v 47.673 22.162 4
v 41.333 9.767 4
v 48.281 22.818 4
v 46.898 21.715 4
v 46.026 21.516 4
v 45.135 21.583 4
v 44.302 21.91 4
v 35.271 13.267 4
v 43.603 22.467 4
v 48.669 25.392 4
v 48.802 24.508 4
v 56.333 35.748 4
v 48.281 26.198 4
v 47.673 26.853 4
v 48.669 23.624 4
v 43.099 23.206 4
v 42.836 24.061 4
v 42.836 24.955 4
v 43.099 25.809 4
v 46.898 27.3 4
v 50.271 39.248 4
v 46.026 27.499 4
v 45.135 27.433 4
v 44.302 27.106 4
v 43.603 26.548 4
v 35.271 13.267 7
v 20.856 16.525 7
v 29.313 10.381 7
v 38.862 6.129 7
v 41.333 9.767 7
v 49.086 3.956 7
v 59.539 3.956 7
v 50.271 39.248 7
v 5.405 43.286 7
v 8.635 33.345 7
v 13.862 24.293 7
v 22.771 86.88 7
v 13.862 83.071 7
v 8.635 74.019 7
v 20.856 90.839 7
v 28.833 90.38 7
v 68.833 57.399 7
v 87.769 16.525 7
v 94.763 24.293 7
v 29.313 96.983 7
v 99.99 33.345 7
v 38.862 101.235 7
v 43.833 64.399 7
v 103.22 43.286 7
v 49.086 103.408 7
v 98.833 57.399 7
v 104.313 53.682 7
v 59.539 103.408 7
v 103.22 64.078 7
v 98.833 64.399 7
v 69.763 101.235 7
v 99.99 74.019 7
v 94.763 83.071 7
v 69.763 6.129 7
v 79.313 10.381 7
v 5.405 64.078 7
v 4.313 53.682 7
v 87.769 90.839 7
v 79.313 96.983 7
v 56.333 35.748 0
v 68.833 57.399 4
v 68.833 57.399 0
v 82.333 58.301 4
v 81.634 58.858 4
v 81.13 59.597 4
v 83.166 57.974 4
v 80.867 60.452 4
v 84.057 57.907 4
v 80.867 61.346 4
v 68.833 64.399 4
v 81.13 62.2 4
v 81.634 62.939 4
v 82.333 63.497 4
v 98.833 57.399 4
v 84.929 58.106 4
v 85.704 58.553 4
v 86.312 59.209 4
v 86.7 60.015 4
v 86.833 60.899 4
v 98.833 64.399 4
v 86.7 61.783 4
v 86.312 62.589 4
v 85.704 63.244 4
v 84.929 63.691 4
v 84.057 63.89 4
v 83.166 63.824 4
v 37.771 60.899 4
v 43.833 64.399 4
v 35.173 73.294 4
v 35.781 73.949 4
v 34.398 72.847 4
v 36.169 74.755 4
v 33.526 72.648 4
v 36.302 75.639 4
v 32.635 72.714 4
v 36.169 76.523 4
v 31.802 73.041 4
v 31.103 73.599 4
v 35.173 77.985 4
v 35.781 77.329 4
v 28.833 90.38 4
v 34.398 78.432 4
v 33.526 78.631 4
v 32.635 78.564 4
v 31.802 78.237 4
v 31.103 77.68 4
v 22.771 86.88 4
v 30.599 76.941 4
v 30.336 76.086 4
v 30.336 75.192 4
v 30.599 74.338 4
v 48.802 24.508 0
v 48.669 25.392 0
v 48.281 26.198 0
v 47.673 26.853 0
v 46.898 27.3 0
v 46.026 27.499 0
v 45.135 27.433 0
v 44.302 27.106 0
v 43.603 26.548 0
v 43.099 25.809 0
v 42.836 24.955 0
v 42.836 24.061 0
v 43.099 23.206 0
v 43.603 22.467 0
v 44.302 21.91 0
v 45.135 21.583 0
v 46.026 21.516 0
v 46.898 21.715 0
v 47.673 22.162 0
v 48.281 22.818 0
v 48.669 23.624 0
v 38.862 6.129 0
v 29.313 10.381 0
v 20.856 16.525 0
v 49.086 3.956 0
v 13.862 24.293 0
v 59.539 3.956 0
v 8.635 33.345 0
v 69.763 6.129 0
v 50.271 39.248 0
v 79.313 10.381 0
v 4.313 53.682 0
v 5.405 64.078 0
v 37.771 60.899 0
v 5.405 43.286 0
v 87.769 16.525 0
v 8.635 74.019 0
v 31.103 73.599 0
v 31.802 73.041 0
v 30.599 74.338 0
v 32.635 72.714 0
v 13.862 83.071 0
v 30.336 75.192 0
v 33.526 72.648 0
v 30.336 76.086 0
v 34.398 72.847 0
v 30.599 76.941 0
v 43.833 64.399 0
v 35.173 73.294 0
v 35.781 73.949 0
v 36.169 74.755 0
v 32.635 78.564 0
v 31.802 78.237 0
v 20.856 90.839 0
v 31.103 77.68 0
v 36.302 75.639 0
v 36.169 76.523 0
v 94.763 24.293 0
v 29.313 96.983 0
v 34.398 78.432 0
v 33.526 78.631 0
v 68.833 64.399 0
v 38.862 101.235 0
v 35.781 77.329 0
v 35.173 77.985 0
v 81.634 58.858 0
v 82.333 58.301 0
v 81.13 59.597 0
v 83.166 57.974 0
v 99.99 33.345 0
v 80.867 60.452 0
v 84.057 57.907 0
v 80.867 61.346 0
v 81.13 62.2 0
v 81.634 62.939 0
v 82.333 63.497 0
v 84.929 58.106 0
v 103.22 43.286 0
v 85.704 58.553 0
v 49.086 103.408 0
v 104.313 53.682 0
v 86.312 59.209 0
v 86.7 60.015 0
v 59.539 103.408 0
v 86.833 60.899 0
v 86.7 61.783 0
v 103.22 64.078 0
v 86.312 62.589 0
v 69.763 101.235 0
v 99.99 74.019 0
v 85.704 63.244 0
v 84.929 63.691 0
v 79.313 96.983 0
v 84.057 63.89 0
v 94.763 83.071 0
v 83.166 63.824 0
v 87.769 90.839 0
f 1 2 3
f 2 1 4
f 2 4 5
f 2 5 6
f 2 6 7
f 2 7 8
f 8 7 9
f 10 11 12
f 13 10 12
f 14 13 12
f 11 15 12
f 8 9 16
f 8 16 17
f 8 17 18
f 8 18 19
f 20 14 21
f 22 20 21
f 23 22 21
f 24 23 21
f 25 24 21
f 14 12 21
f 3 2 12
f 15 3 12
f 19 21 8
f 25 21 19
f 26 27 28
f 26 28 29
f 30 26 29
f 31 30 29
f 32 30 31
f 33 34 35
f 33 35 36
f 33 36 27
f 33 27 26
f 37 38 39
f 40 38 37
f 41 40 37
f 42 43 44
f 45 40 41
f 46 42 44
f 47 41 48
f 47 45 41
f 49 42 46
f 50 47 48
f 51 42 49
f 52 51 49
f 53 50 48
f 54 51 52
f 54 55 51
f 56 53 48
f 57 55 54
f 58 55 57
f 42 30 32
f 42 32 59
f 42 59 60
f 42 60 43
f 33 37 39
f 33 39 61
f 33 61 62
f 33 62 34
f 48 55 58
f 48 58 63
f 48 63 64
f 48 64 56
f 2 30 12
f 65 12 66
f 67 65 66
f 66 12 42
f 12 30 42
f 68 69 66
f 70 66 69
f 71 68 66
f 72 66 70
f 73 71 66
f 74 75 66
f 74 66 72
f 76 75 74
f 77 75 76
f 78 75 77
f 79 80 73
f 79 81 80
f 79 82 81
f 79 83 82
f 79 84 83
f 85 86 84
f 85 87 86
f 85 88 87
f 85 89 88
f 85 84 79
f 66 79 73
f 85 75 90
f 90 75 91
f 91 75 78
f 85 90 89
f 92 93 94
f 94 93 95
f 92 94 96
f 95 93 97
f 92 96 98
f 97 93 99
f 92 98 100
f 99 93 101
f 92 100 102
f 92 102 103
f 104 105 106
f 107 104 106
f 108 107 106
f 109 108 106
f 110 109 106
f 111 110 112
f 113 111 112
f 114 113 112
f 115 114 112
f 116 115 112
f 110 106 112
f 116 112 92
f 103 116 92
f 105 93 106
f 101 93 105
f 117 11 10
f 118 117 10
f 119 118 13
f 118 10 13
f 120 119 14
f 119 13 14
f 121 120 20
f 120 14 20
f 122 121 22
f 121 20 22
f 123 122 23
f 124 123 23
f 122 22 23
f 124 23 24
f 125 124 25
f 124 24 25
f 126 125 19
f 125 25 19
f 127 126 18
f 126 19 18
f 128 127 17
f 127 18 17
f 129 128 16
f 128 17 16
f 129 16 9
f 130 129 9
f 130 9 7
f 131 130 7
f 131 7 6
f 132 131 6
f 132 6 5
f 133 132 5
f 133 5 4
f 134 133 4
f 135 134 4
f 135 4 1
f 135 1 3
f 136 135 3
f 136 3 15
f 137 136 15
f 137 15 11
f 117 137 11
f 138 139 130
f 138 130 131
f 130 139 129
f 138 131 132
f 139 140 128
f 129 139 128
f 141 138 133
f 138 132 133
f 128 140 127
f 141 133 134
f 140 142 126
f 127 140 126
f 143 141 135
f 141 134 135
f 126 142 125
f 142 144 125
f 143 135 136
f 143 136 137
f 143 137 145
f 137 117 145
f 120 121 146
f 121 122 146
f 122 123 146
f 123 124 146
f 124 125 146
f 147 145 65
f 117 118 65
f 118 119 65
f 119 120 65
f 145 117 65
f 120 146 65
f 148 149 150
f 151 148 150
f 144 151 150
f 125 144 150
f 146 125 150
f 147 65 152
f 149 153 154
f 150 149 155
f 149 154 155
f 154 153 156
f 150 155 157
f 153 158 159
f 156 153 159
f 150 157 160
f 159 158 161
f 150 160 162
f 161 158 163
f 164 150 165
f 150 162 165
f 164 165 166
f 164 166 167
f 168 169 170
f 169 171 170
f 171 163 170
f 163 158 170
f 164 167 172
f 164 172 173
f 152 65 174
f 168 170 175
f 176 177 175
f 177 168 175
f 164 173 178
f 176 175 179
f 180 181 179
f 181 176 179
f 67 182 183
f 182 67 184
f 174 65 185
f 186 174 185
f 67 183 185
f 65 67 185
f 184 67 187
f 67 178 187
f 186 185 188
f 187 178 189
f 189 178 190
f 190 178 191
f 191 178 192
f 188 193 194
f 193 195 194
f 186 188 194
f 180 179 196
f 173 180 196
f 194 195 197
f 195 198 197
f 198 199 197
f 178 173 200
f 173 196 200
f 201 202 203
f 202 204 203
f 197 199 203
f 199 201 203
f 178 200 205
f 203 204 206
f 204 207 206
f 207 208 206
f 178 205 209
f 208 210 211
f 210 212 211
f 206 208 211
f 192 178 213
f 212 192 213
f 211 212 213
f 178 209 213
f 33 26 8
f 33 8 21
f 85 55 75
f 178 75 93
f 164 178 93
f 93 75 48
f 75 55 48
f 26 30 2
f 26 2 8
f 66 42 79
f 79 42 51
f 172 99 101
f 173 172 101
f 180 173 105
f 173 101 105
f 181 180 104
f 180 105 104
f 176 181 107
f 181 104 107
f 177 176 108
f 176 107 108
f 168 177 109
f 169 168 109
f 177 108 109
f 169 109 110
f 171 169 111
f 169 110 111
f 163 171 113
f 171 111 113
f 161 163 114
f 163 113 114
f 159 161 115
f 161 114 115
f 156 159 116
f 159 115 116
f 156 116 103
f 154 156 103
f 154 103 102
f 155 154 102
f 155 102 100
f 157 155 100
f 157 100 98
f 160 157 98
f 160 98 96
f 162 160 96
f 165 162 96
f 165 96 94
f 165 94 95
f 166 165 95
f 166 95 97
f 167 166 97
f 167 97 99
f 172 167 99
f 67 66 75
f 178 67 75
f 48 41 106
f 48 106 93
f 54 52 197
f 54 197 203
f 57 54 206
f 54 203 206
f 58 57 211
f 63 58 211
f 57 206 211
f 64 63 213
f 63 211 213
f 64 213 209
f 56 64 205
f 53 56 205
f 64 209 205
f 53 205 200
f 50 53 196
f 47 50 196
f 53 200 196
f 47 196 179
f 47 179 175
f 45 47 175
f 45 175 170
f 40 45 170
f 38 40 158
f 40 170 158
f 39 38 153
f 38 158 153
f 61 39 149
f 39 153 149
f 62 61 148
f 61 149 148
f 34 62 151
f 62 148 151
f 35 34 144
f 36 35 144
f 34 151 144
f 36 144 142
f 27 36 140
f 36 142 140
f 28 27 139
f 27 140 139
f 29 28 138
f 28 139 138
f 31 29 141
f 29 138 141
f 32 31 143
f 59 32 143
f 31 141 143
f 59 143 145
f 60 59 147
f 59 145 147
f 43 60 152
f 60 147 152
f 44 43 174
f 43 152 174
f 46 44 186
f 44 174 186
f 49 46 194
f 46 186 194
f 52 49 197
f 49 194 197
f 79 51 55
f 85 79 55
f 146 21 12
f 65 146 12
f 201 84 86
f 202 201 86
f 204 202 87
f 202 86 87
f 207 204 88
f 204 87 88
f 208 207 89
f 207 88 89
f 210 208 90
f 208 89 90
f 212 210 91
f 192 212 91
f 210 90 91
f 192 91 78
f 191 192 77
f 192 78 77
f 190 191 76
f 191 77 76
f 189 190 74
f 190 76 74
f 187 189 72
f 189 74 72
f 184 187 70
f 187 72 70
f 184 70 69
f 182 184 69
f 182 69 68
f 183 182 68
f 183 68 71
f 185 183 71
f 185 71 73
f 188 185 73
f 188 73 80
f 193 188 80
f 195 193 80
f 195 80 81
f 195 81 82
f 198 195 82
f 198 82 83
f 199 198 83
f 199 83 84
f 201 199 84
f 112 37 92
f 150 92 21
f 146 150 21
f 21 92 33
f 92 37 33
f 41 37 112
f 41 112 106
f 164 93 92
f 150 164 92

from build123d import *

# Parameters (mm, degrees)
SKETCH_R        = 50
PAD_DEPTH       = 7
POCKET_DEPTH    = 7.001
SKETCH005_W     = 30
SKETCH005_H     = 7
POCKET001_DEPTH = 3
SKETCH030_R     = 3
POCKET022_DEPTH = 15


with BuildPart() as part:
    # Sketch → Pad (new body)
    with BuildSketch(Plane.XY):
        with Locations((54.312531, 53.68195)):
            Circle(SKETCH_R)
    extrude(amount=PAD_DEPTH)

    # Sketch004 (on Face3 of Pad) → Pocket (cut, through all)
    with BuildSketch(Plane.XY.offset(7)):
        Polygon((56.333257, 35.748194), (68.833257, 57.398829), (68.833257, 64.398829), (43.833257, 64.398829), (37.771079, 60.898829), (50.271079, 39.248194), align=None)
    extrude(amount=-POCKET_DEPTH, mode=Mode.SUBTRACT)

    # Sketch005 (on Face3 of Pocket) → Pocket001 (cut)
    with BuildSketch(Plane.XY.offset(7)):
        with Locations((83.833257, 60.898829)):
            Rectangle(SKETCH005_W, SKETCH005_H)
        Polygon((56.333257, 35.748194), (41.333257, 9.767432), (35.271079, 13.267432), (50.271079, 39.248194), align=None)
        Polygon((37.771079, 60.898829), (22.771079, 86.879591), (28.833257, 90.379591), (43.833257, 64.398829), align=None)
    extrude(amount=-POCKET001_DEPTH, mode=Mode.SUBTRACT)

    # Sketch030 (on Face3 of Pocket001) → Pocket022 (cut)
    with BuildSketch(Plane.XY.offset(7)):
        with Locations((45.802168, 24.507813)):
            Circle(SKETCH030_R)
        with Locations((33.302168, 75.63921)):
            Circle(SKETCH030_R)
        with Locations((83.833257, 60.898829)):
            Circle(SKETCH030_R)
    extrude(amount=-POCKET022_DEPTH, mode=Mode.SUBTRACT)


solid = part.part
